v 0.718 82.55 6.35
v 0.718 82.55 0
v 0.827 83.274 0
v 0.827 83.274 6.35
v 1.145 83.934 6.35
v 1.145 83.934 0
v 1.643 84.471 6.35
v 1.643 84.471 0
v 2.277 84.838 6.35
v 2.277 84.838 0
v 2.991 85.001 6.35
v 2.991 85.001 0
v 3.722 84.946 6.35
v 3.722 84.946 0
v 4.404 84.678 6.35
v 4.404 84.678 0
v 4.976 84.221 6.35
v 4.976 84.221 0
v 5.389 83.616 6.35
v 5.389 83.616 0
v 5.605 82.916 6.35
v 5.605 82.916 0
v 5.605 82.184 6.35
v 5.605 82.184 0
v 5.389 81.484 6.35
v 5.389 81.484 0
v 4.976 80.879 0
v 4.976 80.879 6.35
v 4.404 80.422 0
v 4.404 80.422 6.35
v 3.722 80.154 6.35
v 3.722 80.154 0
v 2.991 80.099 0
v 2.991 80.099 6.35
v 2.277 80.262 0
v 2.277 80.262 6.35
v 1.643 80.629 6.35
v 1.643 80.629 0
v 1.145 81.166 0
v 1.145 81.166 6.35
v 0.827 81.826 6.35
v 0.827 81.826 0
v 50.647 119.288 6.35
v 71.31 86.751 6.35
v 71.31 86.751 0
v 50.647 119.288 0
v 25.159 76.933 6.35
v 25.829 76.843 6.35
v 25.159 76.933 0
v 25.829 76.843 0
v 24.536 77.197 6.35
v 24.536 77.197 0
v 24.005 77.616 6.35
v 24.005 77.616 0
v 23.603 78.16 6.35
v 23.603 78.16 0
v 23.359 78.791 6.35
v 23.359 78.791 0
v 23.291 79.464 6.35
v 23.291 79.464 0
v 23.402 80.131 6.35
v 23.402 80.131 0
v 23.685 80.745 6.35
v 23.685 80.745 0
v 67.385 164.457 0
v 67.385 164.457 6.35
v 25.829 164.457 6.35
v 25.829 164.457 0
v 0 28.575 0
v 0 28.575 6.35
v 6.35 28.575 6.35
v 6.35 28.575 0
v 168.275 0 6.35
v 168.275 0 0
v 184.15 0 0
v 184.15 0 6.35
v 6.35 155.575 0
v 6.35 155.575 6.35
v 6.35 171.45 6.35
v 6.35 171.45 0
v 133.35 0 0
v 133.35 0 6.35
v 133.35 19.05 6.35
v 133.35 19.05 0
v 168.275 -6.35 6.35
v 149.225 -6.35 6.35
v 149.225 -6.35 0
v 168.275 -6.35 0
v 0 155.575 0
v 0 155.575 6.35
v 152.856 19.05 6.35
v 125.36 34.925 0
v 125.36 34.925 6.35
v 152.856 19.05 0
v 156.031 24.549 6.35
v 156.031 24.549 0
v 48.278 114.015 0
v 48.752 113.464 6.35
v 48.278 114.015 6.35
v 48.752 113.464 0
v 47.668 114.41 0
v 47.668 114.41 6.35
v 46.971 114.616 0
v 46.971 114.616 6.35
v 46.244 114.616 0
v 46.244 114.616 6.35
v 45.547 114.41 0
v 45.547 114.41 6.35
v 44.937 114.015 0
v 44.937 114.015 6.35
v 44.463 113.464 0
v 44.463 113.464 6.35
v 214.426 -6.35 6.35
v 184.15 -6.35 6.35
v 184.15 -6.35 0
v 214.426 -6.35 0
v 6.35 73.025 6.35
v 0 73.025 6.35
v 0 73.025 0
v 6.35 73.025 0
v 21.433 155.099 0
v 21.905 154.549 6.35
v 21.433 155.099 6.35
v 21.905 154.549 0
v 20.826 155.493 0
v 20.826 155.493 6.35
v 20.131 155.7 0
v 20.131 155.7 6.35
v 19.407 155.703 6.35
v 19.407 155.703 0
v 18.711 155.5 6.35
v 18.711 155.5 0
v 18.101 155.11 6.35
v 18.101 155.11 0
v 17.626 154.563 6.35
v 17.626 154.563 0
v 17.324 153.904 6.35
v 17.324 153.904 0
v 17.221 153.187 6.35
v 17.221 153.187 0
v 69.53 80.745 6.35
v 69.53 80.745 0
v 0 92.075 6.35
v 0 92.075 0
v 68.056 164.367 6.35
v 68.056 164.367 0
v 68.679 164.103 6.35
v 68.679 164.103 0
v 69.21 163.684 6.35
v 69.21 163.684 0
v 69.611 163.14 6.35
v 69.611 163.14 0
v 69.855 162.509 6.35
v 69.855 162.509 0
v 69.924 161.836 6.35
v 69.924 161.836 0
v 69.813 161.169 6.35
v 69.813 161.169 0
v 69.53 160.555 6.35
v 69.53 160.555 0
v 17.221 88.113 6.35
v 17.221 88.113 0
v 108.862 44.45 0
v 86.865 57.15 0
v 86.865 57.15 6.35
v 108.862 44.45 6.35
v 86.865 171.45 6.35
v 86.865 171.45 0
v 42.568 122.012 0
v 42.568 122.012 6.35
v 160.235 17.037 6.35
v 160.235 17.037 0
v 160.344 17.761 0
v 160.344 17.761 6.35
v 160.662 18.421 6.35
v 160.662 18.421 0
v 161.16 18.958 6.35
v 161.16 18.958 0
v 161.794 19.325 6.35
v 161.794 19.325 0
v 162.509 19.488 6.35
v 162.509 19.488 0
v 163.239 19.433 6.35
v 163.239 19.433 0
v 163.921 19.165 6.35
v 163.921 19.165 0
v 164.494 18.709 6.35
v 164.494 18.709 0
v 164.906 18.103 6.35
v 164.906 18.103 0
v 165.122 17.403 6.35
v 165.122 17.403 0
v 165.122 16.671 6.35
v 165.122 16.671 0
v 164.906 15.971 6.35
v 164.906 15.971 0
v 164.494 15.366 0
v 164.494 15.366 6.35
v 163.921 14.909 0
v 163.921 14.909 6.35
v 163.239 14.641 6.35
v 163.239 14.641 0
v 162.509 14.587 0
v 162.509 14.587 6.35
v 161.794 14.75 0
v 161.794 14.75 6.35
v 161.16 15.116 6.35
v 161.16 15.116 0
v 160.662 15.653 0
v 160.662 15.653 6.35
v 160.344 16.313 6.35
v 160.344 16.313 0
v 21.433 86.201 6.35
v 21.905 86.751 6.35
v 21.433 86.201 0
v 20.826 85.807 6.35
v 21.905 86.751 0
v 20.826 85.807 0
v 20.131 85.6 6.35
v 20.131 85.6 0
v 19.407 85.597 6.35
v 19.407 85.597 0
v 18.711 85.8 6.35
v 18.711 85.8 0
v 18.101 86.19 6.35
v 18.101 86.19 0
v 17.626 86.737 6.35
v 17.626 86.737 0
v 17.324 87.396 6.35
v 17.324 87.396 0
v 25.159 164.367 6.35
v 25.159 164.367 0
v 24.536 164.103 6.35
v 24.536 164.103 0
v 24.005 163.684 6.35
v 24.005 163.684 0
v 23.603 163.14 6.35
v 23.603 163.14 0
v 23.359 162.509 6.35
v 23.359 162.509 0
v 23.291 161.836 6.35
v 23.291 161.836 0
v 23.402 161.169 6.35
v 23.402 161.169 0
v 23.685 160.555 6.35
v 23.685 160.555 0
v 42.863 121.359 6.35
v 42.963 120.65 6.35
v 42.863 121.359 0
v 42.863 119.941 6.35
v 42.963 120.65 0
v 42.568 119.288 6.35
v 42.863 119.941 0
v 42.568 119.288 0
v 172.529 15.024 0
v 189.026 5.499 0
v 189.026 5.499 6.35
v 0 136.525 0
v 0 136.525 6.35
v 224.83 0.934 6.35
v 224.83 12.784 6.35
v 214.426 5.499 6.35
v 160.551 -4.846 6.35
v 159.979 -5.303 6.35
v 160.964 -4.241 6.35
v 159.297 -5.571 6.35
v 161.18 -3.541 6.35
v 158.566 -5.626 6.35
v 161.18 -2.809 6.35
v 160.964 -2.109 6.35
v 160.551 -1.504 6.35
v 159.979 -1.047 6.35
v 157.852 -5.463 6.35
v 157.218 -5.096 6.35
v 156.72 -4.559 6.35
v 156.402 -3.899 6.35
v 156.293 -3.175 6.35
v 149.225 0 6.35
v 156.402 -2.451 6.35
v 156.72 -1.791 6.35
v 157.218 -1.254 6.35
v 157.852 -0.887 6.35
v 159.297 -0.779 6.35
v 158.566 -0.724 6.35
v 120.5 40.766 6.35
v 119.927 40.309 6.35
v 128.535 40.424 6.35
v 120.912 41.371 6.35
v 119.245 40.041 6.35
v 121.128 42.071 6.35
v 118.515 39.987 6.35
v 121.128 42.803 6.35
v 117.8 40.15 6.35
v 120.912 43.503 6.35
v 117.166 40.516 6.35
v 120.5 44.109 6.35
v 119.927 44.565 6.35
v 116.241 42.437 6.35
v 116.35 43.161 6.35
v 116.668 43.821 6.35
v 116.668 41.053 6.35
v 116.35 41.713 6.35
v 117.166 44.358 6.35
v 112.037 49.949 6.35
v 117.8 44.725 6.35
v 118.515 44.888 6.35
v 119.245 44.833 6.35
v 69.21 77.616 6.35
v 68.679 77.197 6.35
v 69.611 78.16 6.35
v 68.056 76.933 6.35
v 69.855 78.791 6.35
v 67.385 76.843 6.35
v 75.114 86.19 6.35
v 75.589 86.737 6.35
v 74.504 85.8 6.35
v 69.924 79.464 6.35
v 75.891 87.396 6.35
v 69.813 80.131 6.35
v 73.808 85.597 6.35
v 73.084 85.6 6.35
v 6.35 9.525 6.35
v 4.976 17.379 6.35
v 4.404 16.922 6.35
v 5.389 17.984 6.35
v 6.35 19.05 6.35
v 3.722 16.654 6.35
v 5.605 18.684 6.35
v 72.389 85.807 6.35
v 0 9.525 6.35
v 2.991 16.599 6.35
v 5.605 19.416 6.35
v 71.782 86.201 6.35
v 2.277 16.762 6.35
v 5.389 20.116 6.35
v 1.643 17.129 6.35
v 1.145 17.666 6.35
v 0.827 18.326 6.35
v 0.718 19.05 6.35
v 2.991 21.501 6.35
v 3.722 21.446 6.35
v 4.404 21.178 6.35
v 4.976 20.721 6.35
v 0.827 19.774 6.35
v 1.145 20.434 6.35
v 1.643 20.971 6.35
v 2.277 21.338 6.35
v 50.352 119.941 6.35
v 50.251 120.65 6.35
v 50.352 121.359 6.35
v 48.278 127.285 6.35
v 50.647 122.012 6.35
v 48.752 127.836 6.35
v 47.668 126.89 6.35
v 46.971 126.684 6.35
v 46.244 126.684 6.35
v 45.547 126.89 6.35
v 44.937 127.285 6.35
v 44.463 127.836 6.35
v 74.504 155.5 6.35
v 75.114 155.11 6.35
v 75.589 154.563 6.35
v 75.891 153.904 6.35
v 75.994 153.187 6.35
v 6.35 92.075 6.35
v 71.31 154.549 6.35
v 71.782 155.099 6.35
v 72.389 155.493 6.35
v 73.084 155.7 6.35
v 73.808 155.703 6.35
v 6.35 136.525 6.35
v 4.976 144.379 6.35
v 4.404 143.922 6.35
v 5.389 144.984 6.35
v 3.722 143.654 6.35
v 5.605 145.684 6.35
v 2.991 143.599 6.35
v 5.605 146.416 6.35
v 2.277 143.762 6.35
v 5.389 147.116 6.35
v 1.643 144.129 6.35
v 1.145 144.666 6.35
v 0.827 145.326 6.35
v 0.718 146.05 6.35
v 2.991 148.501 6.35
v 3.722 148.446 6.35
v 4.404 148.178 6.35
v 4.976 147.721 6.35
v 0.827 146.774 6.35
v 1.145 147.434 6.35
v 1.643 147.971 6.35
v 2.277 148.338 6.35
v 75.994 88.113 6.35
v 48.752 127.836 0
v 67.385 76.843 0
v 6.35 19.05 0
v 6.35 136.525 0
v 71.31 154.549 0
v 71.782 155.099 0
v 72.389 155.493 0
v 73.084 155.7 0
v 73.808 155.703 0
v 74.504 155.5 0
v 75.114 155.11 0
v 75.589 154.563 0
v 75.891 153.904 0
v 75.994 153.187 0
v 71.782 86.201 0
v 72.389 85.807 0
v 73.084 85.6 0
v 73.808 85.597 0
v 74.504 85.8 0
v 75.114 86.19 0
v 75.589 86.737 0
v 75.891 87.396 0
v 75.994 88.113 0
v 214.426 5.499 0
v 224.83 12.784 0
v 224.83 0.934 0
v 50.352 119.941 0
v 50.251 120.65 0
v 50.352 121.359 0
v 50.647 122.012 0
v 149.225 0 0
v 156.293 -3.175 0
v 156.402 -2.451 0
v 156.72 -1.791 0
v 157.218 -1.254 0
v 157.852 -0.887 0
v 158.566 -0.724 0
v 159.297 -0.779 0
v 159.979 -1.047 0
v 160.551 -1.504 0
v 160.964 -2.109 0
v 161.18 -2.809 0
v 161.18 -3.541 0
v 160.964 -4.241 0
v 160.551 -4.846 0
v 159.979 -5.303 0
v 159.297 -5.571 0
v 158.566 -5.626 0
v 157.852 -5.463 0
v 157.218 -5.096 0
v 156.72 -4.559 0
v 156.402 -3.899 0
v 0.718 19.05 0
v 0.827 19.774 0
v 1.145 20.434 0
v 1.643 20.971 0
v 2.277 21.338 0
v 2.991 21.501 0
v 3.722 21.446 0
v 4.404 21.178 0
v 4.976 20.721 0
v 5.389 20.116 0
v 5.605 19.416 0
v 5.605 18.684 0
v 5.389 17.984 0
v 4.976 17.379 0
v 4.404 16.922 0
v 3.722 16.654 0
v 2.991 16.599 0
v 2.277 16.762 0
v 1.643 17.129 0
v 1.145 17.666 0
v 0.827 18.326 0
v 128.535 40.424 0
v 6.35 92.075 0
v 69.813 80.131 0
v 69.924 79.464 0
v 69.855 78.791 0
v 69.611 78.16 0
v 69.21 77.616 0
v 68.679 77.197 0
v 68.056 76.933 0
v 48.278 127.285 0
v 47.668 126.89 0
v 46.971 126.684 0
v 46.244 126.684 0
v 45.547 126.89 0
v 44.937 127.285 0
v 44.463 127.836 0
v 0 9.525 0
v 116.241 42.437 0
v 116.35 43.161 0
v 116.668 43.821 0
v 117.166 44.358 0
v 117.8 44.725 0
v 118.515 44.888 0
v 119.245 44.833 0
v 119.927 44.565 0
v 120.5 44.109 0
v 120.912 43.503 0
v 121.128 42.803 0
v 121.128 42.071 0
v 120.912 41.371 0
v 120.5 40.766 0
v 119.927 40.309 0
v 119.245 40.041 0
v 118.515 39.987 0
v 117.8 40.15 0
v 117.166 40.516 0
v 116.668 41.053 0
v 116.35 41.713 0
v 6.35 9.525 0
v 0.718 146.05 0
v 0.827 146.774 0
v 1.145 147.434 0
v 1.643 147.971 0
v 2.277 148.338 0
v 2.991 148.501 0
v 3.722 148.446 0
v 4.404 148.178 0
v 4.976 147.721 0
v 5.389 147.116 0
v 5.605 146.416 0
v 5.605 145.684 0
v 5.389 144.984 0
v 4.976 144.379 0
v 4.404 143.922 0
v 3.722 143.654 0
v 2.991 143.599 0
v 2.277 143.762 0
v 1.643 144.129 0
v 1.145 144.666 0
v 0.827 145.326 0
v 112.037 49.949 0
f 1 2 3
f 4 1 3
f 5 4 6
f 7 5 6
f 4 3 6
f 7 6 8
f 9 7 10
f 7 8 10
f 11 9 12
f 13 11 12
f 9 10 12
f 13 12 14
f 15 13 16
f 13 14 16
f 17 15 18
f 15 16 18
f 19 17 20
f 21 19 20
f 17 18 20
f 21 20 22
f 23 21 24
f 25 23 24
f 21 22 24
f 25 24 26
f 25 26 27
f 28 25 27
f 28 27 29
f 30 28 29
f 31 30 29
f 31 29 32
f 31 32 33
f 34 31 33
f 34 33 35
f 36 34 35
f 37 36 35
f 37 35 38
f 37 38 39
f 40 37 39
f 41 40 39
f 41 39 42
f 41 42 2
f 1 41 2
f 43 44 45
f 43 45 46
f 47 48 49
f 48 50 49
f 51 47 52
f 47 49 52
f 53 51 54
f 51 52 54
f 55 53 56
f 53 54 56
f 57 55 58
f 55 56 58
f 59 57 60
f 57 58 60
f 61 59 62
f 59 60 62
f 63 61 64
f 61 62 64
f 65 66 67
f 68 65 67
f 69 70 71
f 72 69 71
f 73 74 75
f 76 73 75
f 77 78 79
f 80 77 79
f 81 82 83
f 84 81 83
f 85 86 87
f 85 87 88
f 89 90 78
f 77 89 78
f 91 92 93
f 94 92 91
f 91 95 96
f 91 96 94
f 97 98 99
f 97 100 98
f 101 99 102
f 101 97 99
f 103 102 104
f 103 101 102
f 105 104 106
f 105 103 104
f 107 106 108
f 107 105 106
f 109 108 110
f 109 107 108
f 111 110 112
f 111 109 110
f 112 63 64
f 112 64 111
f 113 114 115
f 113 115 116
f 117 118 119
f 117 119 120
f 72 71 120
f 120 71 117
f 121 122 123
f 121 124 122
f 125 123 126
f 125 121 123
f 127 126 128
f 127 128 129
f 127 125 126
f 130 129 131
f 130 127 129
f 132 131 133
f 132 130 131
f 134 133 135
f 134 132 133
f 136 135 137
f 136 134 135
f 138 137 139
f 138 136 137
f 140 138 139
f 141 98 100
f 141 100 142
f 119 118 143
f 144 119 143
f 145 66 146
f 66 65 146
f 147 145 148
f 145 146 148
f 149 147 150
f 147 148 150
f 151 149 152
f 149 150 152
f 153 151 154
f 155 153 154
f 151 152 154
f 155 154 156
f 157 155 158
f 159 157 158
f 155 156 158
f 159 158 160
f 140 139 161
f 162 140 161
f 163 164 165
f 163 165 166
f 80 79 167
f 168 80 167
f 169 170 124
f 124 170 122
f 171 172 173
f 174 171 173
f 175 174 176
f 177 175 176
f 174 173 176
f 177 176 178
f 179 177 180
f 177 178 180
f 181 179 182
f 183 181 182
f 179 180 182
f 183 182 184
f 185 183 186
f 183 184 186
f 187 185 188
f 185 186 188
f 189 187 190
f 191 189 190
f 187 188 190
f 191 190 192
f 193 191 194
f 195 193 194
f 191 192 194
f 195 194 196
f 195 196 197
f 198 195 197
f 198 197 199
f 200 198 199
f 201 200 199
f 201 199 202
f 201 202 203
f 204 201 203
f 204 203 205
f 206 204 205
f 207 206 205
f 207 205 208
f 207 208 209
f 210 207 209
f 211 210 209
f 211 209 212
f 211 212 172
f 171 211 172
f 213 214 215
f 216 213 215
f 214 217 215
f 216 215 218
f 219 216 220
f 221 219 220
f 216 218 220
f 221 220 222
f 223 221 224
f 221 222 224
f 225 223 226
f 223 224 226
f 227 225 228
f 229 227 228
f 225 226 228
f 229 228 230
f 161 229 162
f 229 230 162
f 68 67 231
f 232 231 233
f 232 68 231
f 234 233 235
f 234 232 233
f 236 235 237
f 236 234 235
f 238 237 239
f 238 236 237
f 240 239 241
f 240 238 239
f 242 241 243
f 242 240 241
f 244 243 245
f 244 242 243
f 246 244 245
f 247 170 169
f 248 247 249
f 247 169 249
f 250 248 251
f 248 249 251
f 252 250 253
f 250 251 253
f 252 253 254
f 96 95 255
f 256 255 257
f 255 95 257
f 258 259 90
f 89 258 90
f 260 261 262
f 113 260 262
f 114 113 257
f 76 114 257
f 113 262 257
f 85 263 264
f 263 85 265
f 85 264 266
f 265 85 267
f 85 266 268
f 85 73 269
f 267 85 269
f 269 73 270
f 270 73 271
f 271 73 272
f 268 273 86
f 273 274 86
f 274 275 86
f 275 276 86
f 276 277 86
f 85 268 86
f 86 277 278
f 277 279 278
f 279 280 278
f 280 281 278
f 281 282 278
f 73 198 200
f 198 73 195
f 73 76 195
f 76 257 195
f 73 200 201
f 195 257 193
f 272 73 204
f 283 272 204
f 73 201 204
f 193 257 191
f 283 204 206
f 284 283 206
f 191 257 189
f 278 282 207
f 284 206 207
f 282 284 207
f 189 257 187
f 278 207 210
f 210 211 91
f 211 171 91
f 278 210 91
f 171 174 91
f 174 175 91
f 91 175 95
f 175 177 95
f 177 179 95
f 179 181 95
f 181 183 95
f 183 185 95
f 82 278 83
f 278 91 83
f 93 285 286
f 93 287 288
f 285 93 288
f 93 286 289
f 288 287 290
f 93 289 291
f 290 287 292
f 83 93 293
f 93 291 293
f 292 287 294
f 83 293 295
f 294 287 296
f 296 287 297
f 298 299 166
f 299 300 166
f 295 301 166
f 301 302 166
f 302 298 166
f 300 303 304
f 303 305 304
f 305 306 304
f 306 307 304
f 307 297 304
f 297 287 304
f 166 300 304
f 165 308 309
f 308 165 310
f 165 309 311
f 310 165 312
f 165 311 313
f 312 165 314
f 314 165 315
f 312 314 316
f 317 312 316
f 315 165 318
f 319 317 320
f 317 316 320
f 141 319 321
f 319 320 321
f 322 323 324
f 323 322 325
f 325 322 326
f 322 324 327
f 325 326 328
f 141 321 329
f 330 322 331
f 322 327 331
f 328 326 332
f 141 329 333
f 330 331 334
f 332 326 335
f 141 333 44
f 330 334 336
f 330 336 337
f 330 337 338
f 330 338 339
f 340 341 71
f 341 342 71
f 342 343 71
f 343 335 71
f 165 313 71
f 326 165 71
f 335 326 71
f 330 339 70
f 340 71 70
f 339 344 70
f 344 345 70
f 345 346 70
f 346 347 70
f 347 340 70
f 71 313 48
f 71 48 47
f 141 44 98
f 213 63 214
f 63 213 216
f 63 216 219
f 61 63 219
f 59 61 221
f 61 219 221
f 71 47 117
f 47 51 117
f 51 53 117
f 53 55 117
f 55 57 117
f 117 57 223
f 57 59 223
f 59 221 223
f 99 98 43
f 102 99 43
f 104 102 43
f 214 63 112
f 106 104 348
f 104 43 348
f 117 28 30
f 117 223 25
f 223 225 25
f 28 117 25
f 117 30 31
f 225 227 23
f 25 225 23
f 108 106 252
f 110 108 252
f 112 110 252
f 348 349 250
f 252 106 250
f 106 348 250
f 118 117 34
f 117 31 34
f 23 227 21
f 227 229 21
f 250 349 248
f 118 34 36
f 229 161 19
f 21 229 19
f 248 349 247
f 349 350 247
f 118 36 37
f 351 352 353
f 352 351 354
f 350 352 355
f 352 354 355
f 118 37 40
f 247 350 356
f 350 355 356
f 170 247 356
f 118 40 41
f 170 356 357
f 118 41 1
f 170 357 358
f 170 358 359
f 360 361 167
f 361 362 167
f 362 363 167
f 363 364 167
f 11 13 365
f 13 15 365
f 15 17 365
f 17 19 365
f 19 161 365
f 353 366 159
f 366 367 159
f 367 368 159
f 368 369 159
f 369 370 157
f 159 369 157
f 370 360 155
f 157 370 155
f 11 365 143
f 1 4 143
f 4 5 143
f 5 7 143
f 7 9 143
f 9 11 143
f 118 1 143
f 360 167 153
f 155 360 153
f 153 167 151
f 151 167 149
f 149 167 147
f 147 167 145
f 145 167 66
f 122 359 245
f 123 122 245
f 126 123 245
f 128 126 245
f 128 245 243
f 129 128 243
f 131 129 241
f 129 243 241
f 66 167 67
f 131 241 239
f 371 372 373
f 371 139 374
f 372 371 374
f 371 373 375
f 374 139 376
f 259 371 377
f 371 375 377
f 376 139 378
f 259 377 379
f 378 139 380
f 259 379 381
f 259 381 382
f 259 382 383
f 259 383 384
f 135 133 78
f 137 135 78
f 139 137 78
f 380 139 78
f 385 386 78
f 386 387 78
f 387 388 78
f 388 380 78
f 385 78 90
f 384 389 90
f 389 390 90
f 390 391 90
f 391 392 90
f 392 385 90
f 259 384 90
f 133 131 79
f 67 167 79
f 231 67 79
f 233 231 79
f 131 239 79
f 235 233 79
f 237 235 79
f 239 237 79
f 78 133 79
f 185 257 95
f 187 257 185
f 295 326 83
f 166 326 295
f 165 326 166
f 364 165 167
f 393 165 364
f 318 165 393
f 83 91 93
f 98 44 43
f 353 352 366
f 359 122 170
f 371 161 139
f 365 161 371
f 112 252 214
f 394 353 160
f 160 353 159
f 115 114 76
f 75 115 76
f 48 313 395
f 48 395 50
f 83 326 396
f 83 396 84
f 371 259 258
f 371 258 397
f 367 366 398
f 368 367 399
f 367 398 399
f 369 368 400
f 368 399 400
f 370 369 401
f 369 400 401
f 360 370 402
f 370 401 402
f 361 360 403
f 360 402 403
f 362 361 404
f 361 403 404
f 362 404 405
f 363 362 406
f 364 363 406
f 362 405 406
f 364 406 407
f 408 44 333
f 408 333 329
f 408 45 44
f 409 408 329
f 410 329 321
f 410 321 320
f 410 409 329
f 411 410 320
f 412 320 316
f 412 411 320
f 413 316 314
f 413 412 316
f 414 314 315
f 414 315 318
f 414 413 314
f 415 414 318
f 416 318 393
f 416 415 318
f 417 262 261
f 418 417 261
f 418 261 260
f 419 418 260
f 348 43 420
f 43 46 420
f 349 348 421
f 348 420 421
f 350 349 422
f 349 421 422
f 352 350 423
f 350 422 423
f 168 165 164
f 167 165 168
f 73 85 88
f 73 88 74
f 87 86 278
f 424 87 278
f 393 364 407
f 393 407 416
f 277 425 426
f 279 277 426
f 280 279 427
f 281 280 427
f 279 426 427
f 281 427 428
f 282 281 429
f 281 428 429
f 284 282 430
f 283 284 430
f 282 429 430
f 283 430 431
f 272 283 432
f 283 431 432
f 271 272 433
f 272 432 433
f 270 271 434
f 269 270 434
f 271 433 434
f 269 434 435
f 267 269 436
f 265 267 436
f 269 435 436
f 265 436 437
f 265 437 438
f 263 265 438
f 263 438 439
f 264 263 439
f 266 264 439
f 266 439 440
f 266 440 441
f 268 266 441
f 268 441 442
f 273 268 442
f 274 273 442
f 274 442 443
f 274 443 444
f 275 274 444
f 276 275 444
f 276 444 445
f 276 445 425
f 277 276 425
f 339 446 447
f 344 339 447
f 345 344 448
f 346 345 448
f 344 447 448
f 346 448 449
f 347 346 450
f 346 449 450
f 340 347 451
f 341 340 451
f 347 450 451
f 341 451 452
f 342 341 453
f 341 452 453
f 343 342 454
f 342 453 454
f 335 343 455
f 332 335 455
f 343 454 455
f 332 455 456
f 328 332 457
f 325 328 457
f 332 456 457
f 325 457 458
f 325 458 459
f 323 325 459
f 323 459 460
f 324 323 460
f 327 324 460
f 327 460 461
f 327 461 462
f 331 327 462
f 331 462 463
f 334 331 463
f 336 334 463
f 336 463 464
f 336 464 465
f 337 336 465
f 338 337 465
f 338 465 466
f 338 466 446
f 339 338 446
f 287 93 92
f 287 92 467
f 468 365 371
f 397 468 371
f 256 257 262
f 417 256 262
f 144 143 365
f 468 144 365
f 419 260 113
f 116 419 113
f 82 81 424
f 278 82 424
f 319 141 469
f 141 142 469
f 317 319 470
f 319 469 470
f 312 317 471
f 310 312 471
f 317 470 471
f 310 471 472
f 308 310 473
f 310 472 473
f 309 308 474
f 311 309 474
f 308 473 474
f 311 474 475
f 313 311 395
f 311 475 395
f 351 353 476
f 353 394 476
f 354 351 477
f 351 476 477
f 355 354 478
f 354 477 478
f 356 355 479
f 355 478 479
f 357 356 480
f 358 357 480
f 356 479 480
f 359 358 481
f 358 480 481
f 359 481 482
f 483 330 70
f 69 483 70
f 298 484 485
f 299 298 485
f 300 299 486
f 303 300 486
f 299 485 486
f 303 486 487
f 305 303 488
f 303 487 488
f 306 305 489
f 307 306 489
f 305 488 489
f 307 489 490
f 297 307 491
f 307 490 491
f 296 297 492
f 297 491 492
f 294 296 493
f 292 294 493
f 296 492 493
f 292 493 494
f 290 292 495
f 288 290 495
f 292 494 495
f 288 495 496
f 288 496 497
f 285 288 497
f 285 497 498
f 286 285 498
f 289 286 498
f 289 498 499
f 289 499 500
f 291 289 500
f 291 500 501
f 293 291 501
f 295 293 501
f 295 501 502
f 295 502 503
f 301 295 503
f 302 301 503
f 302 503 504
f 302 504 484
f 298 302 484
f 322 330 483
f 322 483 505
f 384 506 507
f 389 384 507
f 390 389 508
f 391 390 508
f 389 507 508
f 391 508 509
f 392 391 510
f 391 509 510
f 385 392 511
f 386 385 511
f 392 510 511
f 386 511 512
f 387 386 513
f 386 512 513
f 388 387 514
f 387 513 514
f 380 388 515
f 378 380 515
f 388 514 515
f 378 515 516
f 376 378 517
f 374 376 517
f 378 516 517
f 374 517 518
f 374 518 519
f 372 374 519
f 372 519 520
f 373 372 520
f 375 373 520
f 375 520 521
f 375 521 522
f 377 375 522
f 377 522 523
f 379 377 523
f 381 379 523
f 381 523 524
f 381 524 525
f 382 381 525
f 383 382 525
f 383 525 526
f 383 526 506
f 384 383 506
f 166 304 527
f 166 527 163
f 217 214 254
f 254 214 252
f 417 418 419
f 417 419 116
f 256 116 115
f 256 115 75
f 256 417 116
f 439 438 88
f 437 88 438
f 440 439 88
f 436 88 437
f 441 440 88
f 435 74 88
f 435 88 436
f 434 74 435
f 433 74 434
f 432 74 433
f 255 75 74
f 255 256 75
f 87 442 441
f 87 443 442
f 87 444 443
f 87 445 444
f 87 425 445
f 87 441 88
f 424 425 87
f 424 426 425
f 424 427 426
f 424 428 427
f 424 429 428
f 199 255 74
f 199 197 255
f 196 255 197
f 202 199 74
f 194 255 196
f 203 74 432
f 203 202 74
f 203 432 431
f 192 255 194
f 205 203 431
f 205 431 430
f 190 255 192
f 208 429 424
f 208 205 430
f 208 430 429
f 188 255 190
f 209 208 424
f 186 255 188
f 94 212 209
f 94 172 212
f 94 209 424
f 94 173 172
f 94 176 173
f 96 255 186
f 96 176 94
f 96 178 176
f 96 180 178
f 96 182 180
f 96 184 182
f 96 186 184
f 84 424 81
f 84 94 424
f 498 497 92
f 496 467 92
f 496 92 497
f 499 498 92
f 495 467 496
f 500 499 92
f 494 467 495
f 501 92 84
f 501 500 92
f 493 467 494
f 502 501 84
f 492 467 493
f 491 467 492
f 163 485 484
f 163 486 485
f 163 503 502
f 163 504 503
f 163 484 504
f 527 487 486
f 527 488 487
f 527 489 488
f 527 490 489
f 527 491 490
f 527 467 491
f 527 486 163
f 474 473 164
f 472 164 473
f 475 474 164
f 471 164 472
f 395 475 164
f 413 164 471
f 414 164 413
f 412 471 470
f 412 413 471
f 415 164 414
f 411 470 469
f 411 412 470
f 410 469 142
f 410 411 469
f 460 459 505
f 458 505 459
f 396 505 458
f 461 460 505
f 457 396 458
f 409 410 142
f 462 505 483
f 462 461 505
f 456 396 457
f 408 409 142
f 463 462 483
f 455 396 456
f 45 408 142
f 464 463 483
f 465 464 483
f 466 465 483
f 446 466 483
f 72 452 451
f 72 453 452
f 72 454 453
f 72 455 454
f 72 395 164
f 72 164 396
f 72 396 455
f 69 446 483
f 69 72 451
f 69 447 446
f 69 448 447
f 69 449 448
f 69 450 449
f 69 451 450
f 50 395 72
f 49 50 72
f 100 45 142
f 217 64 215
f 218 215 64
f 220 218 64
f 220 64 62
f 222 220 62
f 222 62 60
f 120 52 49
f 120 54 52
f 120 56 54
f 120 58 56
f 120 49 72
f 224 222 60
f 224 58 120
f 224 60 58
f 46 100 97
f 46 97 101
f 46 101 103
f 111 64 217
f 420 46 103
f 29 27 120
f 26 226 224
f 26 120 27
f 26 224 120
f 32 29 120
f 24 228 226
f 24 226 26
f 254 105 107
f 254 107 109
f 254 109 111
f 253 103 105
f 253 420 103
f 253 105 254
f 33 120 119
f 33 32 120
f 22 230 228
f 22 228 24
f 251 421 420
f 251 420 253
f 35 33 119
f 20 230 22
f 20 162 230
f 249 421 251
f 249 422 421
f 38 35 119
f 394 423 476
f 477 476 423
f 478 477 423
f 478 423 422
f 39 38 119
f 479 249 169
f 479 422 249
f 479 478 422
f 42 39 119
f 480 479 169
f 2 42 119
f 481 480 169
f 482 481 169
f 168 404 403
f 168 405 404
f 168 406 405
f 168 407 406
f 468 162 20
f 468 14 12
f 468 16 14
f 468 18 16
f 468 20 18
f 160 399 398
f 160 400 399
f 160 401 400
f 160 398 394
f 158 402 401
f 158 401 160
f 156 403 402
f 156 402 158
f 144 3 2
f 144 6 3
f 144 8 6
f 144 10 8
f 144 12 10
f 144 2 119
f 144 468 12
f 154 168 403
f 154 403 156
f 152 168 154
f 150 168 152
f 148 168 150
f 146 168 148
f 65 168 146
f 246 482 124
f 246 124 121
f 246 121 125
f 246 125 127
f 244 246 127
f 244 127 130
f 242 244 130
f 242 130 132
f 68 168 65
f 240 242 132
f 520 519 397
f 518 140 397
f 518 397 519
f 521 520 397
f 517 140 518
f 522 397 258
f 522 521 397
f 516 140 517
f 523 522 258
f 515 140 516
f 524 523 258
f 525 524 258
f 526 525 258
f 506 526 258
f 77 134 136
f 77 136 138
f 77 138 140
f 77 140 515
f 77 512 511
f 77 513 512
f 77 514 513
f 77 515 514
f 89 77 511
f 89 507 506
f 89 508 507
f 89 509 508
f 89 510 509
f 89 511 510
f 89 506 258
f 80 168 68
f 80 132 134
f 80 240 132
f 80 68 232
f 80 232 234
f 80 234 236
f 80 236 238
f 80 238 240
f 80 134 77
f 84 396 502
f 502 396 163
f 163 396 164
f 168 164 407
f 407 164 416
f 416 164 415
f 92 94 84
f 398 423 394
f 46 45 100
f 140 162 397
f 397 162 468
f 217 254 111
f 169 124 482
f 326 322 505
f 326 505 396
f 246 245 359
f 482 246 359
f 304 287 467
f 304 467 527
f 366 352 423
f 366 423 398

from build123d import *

# Parameters (mm, degrees)
BOSS_EXTRUDE1_DEPTH          = 6.35
SKETCH2_W                    = 127
SKETCH2_H                    = 19.05
CUT_EXTRUDE1_DEPTH           = 195.543611155
SKETCH3_W                    = 86.864773719
SKETCH3_H                    = 114.3
BOSS_EXTRUDE2_DEPTH          = 6.35
SKETCH4_W                    = 6.35
SKETCH4_H                    = 9.525
SKETCH4_H_2                  = 44.45
SKETCH4_H_3                  = 15.875
CUT_EXTRUDE2_DEPTH           = 253.93516292
SKETCH5_W                    = 19.05
SKETCH5_H                    = 6.35
BOSS_EXTRUDE3_DEPTH          = 6.35
BOSS_EXTRUDE4_DEPTH          = 6.35
LPATTERN1_COUNT              = 2
LPATTERN1_PITCH              = 50.8
F_10_0_1935_DIAMETER_HOLE1_D = 4.9149
F_10_0_1935_DIAMETER_HOLE2_D = 4.9149
BOSS_EXTRUDE8_DEPTH          = 6.35
CUT_EXTRUDE4_DEPTH           = 283.81411342
FILLET1_R                    = 2.54


with BuildPart() as part:
    # Sketch1 → Boss-Extrude1 (new body)
    with BuildSketch(Plane.XY):
        Polygon((86.864773719, 57.15), (185.851477372, 0), (86.864773719, 0), (0, 0), (0, 57.15), align=None)
    extrude(amount=BOSS_EXTRUDE1_DEPTH)

    # Sketch2 → Cut-Extrude1 (cut, through all)
    with BuildSketch(Plane.XY.offset(6.35)):
        with Locations((69.85, 9.525)):
            Rectangle(SKETCH2_W, SKETCH2_H)
    extrude(amount=-CUT_EXTRUDE1_DEPTH, mode=Mode.SUBTRACT)

    # Sketch3 → Boss-Extrude2 (add)
    with BuildSketch(Plane.XY.offset(6.35)):
        with Locations((43.432386859, 114.3)):
            Rectangle(SKETCH3_W, SKETCH3_H)
    extrude(amount=-BOSS_EXTRUDE2_DEPTH)

    # Sketch4 → Cut-Extrude2 (cut, through all)
    with BuildSketch(Plane.XY.offset(6.35)):
        with Locations((3.175, 4.7625)):
            Rectangle(SKETCH4_W, SKETCH4_H)
        with Locations((3.175, 50.8)):
            Rectangle(SKETCH4_W, SKETCH4_H_2)
        with Locations((3.175, 114.3)):
            Rectangle(SKETCH4_W, SKETCH4_H_2)
        with Locations((3.175, 163.5125)):
            Rectangle(SKETCH4_W, SKETCH4_H_3)
    extrude(amount=-CUT_EXTRUDE2_DEPTH, mode=Mode.SUBTRACT)

    # Sketch5 → Boss-Extrude3 (add)
    with BuildSketch(Plane.XY.offset(6.35)):
        with Locations((158.75, -3.175)):
            Rectangle(SKETCH5_W, SKETCH5_H)
    extrude(amount=-BOSS_EXTRUDE3_DEPTH)

    # Sketch6 → Boss-Extrude4 (add)
    with BuildSketch(Plane.XY.offset(6.35)):
        Polygon((108.861818976, 44.45), (125.359602918, 34.925), (128.534602918, 40.424261314), (112.036818976, 49.949261314), align=None)
    boss_extrude4 = extrude(amount=-BOSS_EXTRUDE4_DEPTH)

    # LPattern1: Boss-Extrude4 ×2
    with Locations(*[Vector(0.8660254037844415, -0.49999999999999517, 0) * (i * LPATTERN1_PITCH) for i in range(1, LPATTERN1_COUNT)]):
        add(boss_extrude4)

    # #10 (0.1935) Diameter Hole1 (through all)
    with Locations(Plane.XY.offset(6.35)):
        with Locations((3.175, 146.05), (3.175, 82.55), (3.175, 19.05)):
            Hole(F_10_0_1935_DIAMETER_HOLE1_D / 2)

    # #10 (0.1935) Diameter Hole2 (through all)
    with Locations(Plane.XY.offset(6.35)):
        with Locations((118.698210947, 42.437130657), (162.692301459, 17.037130657), (158.75, -3.175)):
            Hole(F_10_0_1935_DIAMETER_HOLE2_D / 2)

    # Sketch20 → Boss-Extrude8 (add)
    with BuildSketch(Plane.XY.offset(6.35)):
        Polygon((172.52869343, 15.024261314), (189.026477372, 5.499261314), (214.426477372, 5.499261314), (224.829708334, 12.783682056), (224.829708334, 0.934420742), (214.426477372, -6.35), (185.851477372, -6.35), (184.15, -6.35), (184.15, 0), (185.851477372, 0), (169.35369343, 9.525), align=None)
    extrude(amount=-BOSS_EXTRUDE8_DEPTH)

    # Sketch22 → Cut-Extrude4 (cut, through all)
    with BuildSketch(Plane.XY.offset(6.35)):
        Polygon((17.220652064, 161.925), (17.220652064, 79.375), (43.43238686, 120.65), align=None)
        Polygon((75.994121656, 79.375), (49.78238686, 120.65), (75.994121656, 161.925), align=None)
        Polygon((21.20738686, 164.45678038), (46.60738686, 124.46), (72.00738686, 164.45678038), align=None)
        Polygon((46.60738686, 116.84), (72.00738686, 76.84321962), (21.20738686, 76.84321962), align=None)
    extrude(amount=-CUT_EXTRUDE4_DEPTH, mode=Mode.SUBTRACT)

    # Fillet1
    fillet1_edges = [part.edges().sort_by_distance(p)[0] for p in [
        (17.220652064, 161.925, 3.175),
        (43.43238686, 120.65, 3.175),
        (17.220652064, 79.375, 3.175),
        (75.994121656, 161.925, 3.175),
        (75.994121656, 79.375, 3.175),
        (49.78238686, 120.65, 3.175),
        (21.20738686, 164.45678038, 3.175),
        (72.00738686, 164.45678038, 3.175),
        (46.60738686, 124.46, 3.175),
        (21.20738686, 76.84321962, 3.175),
        (46.60738686, 116.84, 3.175),
        (72.00738686, 76.84321962, 3.175),
    ]]
    fillet(fillet1_edges, radius=FILLET1_R)


solid = part.part
